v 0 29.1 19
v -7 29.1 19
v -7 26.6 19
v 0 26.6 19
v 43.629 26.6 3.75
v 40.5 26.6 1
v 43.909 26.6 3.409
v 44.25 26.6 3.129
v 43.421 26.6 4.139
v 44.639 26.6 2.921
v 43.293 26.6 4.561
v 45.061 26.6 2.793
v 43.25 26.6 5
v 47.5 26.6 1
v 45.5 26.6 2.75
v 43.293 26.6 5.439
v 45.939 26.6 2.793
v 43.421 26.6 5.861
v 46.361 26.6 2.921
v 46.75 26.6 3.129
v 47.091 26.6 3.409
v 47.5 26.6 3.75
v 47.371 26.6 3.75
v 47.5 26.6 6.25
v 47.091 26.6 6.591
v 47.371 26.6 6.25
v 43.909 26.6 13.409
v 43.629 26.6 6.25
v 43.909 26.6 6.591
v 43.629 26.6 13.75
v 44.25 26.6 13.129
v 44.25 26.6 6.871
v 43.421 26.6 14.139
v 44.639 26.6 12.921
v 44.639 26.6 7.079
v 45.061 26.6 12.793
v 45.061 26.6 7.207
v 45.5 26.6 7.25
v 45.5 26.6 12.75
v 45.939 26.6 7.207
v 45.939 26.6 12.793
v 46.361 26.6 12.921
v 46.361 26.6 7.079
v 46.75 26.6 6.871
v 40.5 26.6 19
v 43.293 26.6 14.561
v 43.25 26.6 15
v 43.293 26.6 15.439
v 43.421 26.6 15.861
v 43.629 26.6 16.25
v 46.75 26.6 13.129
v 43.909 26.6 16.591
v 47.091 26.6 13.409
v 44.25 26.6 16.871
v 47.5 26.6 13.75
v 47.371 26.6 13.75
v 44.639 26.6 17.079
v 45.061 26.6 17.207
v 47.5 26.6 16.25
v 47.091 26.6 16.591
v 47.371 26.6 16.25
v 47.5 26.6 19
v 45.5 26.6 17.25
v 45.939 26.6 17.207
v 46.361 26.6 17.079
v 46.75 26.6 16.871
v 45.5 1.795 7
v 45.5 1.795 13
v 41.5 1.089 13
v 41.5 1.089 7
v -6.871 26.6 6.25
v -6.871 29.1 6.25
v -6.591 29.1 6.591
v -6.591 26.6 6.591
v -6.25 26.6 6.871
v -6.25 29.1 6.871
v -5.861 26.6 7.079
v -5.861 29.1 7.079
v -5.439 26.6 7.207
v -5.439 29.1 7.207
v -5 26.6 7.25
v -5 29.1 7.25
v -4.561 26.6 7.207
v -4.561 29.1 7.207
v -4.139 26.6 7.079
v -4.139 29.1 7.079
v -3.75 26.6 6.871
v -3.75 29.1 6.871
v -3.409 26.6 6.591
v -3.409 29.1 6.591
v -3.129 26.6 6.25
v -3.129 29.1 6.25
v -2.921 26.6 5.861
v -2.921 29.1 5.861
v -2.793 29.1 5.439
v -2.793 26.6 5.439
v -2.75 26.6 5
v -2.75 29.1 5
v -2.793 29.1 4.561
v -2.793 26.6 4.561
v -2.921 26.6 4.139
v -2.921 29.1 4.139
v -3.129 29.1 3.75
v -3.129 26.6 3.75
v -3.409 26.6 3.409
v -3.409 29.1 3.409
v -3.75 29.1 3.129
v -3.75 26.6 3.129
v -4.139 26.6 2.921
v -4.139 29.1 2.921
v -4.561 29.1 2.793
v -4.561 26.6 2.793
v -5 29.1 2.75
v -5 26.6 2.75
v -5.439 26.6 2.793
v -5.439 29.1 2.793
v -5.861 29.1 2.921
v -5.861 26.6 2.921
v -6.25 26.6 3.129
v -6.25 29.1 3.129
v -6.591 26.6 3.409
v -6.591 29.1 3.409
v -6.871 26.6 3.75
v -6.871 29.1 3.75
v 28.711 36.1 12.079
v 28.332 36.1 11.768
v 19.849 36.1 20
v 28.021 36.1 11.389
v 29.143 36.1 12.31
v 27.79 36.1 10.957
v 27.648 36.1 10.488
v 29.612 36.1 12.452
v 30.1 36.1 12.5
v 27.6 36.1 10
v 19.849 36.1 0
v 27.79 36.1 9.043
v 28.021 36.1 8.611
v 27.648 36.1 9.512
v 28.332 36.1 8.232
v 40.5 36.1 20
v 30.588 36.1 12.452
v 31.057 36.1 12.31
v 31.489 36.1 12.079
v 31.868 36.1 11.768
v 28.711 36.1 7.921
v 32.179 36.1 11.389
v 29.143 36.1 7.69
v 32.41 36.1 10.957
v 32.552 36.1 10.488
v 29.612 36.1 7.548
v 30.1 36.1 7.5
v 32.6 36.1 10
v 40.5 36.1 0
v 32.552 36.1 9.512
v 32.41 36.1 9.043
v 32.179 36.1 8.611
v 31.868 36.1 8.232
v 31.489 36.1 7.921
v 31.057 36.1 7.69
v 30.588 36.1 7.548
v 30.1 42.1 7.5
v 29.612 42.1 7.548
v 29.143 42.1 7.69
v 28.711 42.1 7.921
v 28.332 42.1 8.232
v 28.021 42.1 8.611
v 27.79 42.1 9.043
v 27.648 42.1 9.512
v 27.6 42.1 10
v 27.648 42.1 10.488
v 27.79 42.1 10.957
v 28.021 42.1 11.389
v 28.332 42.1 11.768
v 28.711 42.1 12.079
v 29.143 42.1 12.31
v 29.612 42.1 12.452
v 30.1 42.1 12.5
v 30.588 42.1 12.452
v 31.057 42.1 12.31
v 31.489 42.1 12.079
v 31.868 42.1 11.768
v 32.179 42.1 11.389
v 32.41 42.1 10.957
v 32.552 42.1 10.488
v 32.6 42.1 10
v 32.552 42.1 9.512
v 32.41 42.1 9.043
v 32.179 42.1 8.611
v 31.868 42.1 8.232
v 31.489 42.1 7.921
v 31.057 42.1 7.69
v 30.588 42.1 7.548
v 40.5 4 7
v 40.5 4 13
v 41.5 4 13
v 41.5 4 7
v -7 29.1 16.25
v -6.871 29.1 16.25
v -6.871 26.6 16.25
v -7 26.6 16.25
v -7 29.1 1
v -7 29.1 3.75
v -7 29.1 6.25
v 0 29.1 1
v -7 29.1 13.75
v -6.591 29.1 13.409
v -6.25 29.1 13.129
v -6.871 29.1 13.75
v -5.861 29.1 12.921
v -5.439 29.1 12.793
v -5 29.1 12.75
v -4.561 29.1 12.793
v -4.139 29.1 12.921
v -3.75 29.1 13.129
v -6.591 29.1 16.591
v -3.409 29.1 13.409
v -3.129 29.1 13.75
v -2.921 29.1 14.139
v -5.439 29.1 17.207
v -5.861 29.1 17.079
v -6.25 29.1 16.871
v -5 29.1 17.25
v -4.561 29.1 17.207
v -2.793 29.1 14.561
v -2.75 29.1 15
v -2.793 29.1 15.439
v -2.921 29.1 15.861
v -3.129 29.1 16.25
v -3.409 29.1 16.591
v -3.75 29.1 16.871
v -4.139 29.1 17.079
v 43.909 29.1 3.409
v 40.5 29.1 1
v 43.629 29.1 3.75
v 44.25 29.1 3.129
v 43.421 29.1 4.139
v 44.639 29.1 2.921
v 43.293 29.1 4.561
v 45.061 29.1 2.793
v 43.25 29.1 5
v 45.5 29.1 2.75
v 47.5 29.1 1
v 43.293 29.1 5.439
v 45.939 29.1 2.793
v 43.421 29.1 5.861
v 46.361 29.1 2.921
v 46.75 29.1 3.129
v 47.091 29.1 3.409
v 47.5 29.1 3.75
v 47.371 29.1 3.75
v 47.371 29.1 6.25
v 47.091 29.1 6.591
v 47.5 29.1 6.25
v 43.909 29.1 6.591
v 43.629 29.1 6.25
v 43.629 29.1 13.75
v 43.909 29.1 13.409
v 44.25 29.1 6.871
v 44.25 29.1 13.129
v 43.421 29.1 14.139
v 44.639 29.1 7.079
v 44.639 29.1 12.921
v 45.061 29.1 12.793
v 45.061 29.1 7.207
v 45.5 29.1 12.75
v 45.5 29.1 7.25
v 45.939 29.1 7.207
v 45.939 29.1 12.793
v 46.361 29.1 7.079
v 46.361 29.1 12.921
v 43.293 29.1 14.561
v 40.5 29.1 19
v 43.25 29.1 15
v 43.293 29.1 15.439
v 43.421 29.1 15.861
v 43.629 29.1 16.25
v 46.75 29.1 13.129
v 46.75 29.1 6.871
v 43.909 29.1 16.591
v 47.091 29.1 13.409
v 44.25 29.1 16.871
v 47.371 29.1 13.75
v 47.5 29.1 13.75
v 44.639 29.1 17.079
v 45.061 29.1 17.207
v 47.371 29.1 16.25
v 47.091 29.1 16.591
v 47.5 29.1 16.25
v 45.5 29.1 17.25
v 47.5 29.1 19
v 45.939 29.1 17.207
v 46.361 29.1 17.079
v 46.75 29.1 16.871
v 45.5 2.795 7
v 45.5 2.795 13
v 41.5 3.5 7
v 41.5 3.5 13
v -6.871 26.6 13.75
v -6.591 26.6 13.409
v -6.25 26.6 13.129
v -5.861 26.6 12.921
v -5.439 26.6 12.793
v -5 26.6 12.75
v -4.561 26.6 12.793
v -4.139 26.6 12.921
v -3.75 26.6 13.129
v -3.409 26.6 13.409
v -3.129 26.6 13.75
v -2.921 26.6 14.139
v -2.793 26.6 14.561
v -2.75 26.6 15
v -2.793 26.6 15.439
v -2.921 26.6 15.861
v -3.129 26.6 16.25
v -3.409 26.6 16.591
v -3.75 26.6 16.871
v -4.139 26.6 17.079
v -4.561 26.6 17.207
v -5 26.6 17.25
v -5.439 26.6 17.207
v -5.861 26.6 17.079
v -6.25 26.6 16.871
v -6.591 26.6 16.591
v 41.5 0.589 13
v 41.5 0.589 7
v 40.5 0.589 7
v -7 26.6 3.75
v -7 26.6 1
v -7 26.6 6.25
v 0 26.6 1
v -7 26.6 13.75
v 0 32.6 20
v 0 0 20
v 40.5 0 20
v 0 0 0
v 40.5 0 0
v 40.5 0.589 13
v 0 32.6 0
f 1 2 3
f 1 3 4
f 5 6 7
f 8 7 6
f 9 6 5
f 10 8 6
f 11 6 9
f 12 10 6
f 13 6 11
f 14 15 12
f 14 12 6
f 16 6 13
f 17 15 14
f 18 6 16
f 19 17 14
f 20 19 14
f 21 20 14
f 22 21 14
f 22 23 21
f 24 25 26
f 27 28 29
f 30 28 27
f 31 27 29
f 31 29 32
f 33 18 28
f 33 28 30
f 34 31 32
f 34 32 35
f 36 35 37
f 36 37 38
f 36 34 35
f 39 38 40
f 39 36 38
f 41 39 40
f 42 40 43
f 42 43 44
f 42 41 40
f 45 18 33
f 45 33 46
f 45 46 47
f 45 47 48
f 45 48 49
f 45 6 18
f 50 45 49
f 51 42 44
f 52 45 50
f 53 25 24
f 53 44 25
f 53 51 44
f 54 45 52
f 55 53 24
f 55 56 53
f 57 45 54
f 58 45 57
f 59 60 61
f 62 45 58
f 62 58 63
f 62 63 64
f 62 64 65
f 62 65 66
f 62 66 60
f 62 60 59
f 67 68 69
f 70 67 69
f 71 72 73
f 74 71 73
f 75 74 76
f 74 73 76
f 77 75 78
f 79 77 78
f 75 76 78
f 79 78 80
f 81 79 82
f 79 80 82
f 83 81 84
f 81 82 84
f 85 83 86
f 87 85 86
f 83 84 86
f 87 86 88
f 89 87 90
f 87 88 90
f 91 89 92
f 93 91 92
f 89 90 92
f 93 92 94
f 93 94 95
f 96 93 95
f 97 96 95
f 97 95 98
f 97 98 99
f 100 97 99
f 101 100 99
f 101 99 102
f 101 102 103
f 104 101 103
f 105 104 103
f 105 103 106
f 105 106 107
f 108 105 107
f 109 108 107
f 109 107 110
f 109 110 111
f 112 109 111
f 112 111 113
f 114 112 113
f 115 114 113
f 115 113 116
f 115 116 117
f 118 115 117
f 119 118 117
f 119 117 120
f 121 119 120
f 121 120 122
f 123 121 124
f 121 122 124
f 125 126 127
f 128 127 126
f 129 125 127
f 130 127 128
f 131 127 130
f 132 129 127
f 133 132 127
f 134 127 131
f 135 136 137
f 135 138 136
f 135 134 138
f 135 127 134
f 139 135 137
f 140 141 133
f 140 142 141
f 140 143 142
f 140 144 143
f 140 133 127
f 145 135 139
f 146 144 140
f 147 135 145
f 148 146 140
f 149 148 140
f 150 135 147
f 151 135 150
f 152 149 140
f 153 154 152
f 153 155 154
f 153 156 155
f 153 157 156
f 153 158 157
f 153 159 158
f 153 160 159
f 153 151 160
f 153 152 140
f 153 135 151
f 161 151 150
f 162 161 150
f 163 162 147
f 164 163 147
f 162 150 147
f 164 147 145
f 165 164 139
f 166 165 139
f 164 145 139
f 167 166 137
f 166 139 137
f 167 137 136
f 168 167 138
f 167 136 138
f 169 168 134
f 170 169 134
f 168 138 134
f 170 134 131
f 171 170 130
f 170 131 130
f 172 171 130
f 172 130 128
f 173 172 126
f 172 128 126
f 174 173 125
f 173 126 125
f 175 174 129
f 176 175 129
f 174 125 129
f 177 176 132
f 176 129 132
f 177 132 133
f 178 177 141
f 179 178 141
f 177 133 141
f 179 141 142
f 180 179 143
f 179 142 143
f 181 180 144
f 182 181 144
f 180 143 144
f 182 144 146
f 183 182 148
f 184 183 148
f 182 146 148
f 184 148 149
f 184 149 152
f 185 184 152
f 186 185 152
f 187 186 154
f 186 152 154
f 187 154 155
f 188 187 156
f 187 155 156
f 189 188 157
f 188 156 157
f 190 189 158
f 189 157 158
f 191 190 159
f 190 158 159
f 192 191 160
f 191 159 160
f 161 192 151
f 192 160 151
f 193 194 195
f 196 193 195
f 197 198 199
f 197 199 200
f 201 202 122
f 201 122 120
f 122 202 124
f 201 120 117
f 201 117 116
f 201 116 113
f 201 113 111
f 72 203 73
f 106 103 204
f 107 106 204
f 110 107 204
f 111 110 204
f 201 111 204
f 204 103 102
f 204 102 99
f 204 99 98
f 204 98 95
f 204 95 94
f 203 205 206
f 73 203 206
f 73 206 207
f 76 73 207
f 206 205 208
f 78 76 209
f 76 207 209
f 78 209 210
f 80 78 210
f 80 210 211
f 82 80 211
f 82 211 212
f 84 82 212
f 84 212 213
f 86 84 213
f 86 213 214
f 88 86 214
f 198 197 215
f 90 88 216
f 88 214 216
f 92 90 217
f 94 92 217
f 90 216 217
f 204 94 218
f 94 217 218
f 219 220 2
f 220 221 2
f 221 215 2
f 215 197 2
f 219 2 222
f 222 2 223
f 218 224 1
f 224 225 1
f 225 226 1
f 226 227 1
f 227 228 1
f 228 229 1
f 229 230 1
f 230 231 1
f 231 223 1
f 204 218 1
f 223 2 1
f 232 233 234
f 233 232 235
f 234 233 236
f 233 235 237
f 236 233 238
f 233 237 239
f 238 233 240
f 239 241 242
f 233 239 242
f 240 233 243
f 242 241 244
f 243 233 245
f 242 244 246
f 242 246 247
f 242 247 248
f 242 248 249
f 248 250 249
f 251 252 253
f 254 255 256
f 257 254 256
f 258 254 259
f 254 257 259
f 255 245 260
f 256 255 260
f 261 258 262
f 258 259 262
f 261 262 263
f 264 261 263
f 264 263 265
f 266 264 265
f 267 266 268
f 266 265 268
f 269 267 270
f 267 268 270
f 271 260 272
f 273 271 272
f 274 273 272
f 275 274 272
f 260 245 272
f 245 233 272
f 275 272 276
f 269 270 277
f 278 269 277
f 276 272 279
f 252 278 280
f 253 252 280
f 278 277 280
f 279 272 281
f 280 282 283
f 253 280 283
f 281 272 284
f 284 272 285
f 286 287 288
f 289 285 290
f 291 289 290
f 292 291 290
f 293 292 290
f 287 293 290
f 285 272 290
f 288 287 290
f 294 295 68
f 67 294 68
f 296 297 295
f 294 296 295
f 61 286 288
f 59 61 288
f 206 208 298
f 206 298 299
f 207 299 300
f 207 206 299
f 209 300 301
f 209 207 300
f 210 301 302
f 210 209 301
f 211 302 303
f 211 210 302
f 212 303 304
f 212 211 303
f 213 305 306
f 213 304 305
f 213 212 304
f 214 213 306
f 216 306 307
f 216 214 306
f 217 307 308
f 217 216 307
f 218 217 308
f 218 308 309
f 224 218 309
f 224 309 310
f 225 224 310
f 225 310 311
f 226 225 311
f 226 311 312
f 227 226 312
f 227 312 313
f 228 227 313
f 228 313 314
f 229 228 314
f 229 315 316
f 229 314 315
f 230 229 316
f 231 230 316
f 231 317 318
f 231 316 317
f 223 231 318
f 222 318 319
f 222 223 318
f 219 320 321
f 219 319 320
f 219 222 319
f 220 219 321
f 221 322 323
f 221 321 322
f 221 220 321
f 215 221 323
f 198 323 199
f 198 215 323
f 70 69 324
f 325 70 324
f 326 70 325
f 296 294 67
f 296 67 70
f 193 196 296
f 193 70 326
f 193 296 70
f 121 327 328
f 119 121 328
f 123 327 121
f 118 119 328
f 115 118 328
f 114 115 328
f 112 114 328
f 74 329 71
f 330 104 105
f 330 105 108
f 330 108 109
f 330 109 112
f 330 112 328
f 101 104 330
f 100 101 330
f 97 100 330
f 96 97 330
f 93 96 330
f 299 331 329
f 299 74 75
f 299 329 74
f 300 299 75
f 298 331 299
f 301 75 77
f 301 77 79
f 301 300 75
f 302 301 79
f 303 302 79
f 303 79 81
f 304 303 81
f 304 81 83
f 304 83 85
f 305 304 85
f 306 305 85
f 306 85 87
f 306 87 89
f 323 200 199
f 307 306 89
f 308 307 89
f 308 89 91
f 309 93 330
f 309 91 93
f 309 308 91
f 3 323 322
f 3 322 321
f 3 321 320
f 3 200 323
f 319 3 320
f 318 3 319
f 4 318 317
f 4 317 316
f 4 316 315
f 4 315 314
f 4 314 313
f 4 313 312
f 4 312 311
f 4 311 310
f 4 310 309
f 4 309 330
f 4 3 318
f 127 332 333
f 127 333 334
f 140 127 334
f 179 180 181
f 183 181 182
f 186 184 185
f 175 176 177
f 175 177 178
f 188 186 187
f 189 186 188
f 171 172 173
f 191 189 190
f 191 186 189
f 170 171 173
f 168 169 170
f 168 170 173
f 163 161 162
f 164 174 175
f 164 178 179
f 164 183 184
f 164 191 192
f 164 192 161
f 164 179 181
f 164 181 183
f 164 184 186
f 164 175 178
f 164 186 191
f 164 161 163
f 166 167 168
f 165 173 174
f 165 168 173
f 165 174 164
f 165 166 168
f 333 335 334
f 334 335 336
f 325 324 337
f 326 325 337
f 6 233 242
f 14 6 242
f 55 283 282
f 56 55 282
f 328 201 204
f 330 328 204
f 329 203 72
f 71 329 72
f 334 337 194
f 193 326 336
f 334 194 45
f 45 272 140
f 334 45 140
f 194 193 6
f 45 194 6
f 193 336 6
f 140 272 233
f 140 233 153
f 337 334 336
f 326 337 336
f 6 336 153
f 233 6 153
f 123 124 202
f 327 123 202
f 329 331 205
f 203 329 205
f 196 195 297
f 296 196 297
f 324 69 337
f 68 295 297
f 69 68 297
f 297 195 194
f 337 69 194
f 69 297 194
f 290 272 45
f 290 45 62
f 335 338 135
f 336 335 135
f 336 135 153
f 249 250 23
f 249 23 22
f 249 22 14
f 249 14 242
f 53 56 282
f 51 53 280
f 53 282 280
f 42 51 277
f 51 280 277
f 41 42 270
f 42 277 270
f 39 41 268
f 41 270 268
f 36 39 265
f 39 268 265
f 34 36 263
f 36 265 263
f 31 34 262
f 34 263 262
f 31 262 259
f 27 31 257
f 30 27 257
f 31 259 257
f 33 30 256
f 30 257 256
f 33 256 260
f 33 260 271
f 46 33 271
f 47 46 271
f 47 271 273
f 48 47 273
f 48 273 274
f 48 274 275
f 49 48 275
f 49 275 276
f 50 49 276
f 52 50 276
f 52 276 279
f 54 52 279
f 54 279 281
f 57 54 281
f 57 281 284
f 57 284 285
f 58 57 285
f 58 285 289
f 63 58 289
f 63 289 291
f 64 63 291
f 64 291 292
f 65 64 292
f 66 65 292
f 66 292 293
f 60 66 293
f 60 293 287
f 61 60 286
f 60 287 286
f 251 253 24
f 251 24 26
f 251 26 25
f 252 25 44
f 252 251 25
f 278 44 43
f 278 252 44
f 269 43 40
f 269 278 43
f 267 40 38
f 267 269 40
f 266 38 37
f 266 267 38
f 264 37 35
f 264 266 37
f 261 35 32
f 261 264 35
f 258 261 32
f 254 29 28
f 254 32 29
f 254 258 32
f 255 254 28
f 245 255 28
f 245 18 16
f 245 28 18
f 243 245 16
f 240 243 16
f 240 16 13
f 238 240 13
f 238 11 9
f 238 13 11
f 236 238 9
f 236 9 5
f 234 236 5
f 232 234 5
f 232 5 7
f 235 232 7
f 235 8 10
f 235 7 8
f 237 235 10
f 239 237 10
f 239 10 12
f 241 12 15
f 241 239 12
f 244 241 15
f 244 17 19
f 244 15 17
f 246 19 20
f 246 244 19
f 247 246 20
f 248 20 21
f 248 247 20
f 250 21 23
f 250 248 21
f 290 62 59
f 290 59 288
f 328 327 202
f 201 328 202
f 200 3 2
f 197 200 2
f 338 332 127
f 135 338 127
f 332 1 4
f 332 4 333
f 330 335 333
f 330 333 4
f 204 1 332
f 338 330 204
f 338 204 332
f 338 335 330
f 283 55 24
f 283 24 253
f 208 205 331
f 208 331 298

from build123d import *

# Parameters (mm, degrees)
SKETCH1_W           = 40.5
SKETCH1_H           = 36.1
BOSS_EXTRUDE1_DEPTH = 20
BOSS_EXTRUDE2_START = -1
SKETCH2_W           = 7
SKETCH2_H           = 2.5
BOSS_EXTRUDE2_DEPTH = 18
CUT_EXTRUDE1_REACH  = 61.187
SKETCH4_R           = 2.5
BOSS_EXTRUDE3_DEPTH = 6
BOSS_EXTRUDE4_START = -7
BOSS_EXTRUDE4_DEPTH = 6
CUT_EXTRUDE2_REACH  = 68.548


with BuildPart() as part:
    # Sketch1 → Boss-Extrude1 (new body)
    with BuildSketch(Plane.XY):
        with Locations((20.25, 18.05)):
            Rectangle(SKETCH1_W, SKETCH1_H)
    extrude(amount=BOSS_EXTRUDE1_DEPTH)

    # Sketch2 → Boss-Extrude2 (add)
    with BuildSketch(Plane.XY.offset(20).offset(BOSS_EXTRUDE2_START)):
        with Locations((-3.5, 27.85)):
            Rectangle(SKETCH2_W, SKETCH2_H)
        with Locations((44, 27.85)):
            Rectangle(SKETCH2_W, SKETCH2_H)
    extrude(amount=-BOSS_EXTRUDE2_DEPTH)

    # Sketch3 → Cut-Extrude1 (cut, up to next)
    with BuildSketch(Plane(origin=(0, 29.1, 0), x_dir=(1, 0, 0), z_dir=(0, 1, 0)), mode=Mode.PRIVATE) as cut_extrude1_sk1:
        with BuildLine():
            Line((-6.870828693, -3.75), (-7, -3.75))
            Line((-7, -3.75), (-7, -6.25))
            Line((-7, -6.25), (-6.870828693, -6.25))
            ThreePointArc((-6.870828693, -6.25), (-2.75, -5), (-6.870828693, -3.75))
        make_face()
    cut_extrude1_tool1 = extrude(cut_extrude1_sk1.sketch, amount=-CUT_EXTRUDE1_REACH, mode=Mode.PRIVATE) & part.part
    # Sketch3 → Cut-Extrude1 (cut, up to next)
    with BuildSketch(Plane(origin=(0, 29.1, 0), x_dir=(1, 0, 0), z_dir=(0, 1, 0)), mode=Mode.PRIVATE) as cut_extrude1_sk2:
        with BuildLine():
            Line((-7, -13.75), (-6.870828693, -13.75))
            ThreePointArc((-6.870828693, -13.75), (-2.75, -15), (-6.870828693, -16.25))
            Line((-6.870828693, -16.25), (-7, -16.25))
            Line((-7, -16.25), (-7, -13.75))
        make_face()
    cut_extrude1_tool2 = extrude(cut_extrude1_sk2.sketch, amount=-CUT_EXTRUDE1_REACH, mode=Mode.PRIVATE) & part.part
    # Sketch3 → Cut-Extrude1 (cut, up to next)
    with BuildSketch(Plane(origin=(0, 29.1, 0), x_dir=(1, 0, 0), z_dir=(0, 1, 0)), mode=Mode.PRIVATE) as cut_extrude1_sk3:
        with BuildLine():
            Line((47.370828693, -16.25), (47.5, -16.25))
            Line((47.5, -16.25), (47.5, -13.75))
            Line((47.5, -13.75), (47.370828693, -13.75))
            ThreePointArc((47.370828693, -13.75), (43.25, -15), (47.370828693, -16.25))
        make_face()
    cut_extrude1_tool3 = extrude(cut_extrude1_sk3.sketch, amount=-CUT_EXTRUDE1_REACH, mode=Mode.PRIVATE) & part.part
    # Sketch3 → Cut-Extrude1 (cut, up to next)
    with BuildSketch(Plane(origin=(0, 29.1, 0), x_dir=(1, 0, 0), z_dir=(0, 1, 0)), mode=Mode.PRIVATE) as cut_extrude1_sk4:
        with BuildLine():
            Line((47.5, -6.25), (47.370828693, -6.25))
            ThreePointArc((47.370828693, -6.25), (43.25, -5), (47.370828693, -3.75))
            Line((47.370828693, -3.75), (47.5, -3.75))
            Line((47.5, -3.75), (47.5, -6.25))
        make_face()
    cut_extrude1_tool4 = extrude(cut_extrude1_sk4.sketch, amount=-CUT_EXTRUDE1_REACH, mode=Mode.PRIVATE) & part.part
    add(cut_extrude1_tool1.solids().sort_by_distance((-4.956552, 29.1, 5))[0], mode=Mode.SUBTRACT)
    add(cut_extrude1_tool2.solids().sort_by_distance((-4.956552, 29.1, 15))[0], mode=Mode.SUBTRACT)
    add(cut_extrude1_tool3.solids().sort_by_distance((45.456552, 29.1, 15))[0], mode=Mode.SUBTRACT)
    add(cut_extrude1_tool4.solids().sort_by_distance((45.456552, 29.1, 5))[0], mode=Mode.SUBTRACT)

    # Sketch4 → Boss-Extrude3 (add)
    with BuildSketch(Plane(origin=(0, 36.1, 0), x_dir=(1, 0, 0), z_dir=(0, 1, 0))):
        with Locations(Location((30.1, -10, 0), (0, 0, 90))):
            Circle(SKETCH4_R)
    extrude(amount=BOSS_EXTRUDE3_DEPTH)

    # Sketch5 → Boss-Extrude4 (add)
    with BuildSketch(Plane.XY.offset(20).offset(BOSS_EXTRUDE4_START)):
        Polygon((40.5, 4), (41.5, 4), (41.5, 3.5), (45.5, 2.794692077), (45.5, 1.794692077), (41.5, 1.089384154), (41.5, 0.589384154), (40.5, 0.589384154), align=None)
    extrude(amount=-BOSS_EXTRUDE4_DEPTH)

    # Sketch6 → Cut-Extrude2 (cut, up to next)
    with BuildSketch(Plane.XY.offset(20), mode=Mode.PRIVATE) as cut_extrude2_sk1:
        Polygon((0, 32.6), (19.849486369, 36.1), (0, 36.1), align=None)
    cut_extrude2_tool1 = extrude(cut_extrude2_sk1.sketch, amount=-CUT_EXTRUDE2_REACH, mode=Mode.PRIVATE) & part.part
    add(cut_extrude2_tool1.solids().sort_by_distance((6.616495, 34.933333, 20))[0], mode=Mode.SUBTRACT)


solid = part.part
